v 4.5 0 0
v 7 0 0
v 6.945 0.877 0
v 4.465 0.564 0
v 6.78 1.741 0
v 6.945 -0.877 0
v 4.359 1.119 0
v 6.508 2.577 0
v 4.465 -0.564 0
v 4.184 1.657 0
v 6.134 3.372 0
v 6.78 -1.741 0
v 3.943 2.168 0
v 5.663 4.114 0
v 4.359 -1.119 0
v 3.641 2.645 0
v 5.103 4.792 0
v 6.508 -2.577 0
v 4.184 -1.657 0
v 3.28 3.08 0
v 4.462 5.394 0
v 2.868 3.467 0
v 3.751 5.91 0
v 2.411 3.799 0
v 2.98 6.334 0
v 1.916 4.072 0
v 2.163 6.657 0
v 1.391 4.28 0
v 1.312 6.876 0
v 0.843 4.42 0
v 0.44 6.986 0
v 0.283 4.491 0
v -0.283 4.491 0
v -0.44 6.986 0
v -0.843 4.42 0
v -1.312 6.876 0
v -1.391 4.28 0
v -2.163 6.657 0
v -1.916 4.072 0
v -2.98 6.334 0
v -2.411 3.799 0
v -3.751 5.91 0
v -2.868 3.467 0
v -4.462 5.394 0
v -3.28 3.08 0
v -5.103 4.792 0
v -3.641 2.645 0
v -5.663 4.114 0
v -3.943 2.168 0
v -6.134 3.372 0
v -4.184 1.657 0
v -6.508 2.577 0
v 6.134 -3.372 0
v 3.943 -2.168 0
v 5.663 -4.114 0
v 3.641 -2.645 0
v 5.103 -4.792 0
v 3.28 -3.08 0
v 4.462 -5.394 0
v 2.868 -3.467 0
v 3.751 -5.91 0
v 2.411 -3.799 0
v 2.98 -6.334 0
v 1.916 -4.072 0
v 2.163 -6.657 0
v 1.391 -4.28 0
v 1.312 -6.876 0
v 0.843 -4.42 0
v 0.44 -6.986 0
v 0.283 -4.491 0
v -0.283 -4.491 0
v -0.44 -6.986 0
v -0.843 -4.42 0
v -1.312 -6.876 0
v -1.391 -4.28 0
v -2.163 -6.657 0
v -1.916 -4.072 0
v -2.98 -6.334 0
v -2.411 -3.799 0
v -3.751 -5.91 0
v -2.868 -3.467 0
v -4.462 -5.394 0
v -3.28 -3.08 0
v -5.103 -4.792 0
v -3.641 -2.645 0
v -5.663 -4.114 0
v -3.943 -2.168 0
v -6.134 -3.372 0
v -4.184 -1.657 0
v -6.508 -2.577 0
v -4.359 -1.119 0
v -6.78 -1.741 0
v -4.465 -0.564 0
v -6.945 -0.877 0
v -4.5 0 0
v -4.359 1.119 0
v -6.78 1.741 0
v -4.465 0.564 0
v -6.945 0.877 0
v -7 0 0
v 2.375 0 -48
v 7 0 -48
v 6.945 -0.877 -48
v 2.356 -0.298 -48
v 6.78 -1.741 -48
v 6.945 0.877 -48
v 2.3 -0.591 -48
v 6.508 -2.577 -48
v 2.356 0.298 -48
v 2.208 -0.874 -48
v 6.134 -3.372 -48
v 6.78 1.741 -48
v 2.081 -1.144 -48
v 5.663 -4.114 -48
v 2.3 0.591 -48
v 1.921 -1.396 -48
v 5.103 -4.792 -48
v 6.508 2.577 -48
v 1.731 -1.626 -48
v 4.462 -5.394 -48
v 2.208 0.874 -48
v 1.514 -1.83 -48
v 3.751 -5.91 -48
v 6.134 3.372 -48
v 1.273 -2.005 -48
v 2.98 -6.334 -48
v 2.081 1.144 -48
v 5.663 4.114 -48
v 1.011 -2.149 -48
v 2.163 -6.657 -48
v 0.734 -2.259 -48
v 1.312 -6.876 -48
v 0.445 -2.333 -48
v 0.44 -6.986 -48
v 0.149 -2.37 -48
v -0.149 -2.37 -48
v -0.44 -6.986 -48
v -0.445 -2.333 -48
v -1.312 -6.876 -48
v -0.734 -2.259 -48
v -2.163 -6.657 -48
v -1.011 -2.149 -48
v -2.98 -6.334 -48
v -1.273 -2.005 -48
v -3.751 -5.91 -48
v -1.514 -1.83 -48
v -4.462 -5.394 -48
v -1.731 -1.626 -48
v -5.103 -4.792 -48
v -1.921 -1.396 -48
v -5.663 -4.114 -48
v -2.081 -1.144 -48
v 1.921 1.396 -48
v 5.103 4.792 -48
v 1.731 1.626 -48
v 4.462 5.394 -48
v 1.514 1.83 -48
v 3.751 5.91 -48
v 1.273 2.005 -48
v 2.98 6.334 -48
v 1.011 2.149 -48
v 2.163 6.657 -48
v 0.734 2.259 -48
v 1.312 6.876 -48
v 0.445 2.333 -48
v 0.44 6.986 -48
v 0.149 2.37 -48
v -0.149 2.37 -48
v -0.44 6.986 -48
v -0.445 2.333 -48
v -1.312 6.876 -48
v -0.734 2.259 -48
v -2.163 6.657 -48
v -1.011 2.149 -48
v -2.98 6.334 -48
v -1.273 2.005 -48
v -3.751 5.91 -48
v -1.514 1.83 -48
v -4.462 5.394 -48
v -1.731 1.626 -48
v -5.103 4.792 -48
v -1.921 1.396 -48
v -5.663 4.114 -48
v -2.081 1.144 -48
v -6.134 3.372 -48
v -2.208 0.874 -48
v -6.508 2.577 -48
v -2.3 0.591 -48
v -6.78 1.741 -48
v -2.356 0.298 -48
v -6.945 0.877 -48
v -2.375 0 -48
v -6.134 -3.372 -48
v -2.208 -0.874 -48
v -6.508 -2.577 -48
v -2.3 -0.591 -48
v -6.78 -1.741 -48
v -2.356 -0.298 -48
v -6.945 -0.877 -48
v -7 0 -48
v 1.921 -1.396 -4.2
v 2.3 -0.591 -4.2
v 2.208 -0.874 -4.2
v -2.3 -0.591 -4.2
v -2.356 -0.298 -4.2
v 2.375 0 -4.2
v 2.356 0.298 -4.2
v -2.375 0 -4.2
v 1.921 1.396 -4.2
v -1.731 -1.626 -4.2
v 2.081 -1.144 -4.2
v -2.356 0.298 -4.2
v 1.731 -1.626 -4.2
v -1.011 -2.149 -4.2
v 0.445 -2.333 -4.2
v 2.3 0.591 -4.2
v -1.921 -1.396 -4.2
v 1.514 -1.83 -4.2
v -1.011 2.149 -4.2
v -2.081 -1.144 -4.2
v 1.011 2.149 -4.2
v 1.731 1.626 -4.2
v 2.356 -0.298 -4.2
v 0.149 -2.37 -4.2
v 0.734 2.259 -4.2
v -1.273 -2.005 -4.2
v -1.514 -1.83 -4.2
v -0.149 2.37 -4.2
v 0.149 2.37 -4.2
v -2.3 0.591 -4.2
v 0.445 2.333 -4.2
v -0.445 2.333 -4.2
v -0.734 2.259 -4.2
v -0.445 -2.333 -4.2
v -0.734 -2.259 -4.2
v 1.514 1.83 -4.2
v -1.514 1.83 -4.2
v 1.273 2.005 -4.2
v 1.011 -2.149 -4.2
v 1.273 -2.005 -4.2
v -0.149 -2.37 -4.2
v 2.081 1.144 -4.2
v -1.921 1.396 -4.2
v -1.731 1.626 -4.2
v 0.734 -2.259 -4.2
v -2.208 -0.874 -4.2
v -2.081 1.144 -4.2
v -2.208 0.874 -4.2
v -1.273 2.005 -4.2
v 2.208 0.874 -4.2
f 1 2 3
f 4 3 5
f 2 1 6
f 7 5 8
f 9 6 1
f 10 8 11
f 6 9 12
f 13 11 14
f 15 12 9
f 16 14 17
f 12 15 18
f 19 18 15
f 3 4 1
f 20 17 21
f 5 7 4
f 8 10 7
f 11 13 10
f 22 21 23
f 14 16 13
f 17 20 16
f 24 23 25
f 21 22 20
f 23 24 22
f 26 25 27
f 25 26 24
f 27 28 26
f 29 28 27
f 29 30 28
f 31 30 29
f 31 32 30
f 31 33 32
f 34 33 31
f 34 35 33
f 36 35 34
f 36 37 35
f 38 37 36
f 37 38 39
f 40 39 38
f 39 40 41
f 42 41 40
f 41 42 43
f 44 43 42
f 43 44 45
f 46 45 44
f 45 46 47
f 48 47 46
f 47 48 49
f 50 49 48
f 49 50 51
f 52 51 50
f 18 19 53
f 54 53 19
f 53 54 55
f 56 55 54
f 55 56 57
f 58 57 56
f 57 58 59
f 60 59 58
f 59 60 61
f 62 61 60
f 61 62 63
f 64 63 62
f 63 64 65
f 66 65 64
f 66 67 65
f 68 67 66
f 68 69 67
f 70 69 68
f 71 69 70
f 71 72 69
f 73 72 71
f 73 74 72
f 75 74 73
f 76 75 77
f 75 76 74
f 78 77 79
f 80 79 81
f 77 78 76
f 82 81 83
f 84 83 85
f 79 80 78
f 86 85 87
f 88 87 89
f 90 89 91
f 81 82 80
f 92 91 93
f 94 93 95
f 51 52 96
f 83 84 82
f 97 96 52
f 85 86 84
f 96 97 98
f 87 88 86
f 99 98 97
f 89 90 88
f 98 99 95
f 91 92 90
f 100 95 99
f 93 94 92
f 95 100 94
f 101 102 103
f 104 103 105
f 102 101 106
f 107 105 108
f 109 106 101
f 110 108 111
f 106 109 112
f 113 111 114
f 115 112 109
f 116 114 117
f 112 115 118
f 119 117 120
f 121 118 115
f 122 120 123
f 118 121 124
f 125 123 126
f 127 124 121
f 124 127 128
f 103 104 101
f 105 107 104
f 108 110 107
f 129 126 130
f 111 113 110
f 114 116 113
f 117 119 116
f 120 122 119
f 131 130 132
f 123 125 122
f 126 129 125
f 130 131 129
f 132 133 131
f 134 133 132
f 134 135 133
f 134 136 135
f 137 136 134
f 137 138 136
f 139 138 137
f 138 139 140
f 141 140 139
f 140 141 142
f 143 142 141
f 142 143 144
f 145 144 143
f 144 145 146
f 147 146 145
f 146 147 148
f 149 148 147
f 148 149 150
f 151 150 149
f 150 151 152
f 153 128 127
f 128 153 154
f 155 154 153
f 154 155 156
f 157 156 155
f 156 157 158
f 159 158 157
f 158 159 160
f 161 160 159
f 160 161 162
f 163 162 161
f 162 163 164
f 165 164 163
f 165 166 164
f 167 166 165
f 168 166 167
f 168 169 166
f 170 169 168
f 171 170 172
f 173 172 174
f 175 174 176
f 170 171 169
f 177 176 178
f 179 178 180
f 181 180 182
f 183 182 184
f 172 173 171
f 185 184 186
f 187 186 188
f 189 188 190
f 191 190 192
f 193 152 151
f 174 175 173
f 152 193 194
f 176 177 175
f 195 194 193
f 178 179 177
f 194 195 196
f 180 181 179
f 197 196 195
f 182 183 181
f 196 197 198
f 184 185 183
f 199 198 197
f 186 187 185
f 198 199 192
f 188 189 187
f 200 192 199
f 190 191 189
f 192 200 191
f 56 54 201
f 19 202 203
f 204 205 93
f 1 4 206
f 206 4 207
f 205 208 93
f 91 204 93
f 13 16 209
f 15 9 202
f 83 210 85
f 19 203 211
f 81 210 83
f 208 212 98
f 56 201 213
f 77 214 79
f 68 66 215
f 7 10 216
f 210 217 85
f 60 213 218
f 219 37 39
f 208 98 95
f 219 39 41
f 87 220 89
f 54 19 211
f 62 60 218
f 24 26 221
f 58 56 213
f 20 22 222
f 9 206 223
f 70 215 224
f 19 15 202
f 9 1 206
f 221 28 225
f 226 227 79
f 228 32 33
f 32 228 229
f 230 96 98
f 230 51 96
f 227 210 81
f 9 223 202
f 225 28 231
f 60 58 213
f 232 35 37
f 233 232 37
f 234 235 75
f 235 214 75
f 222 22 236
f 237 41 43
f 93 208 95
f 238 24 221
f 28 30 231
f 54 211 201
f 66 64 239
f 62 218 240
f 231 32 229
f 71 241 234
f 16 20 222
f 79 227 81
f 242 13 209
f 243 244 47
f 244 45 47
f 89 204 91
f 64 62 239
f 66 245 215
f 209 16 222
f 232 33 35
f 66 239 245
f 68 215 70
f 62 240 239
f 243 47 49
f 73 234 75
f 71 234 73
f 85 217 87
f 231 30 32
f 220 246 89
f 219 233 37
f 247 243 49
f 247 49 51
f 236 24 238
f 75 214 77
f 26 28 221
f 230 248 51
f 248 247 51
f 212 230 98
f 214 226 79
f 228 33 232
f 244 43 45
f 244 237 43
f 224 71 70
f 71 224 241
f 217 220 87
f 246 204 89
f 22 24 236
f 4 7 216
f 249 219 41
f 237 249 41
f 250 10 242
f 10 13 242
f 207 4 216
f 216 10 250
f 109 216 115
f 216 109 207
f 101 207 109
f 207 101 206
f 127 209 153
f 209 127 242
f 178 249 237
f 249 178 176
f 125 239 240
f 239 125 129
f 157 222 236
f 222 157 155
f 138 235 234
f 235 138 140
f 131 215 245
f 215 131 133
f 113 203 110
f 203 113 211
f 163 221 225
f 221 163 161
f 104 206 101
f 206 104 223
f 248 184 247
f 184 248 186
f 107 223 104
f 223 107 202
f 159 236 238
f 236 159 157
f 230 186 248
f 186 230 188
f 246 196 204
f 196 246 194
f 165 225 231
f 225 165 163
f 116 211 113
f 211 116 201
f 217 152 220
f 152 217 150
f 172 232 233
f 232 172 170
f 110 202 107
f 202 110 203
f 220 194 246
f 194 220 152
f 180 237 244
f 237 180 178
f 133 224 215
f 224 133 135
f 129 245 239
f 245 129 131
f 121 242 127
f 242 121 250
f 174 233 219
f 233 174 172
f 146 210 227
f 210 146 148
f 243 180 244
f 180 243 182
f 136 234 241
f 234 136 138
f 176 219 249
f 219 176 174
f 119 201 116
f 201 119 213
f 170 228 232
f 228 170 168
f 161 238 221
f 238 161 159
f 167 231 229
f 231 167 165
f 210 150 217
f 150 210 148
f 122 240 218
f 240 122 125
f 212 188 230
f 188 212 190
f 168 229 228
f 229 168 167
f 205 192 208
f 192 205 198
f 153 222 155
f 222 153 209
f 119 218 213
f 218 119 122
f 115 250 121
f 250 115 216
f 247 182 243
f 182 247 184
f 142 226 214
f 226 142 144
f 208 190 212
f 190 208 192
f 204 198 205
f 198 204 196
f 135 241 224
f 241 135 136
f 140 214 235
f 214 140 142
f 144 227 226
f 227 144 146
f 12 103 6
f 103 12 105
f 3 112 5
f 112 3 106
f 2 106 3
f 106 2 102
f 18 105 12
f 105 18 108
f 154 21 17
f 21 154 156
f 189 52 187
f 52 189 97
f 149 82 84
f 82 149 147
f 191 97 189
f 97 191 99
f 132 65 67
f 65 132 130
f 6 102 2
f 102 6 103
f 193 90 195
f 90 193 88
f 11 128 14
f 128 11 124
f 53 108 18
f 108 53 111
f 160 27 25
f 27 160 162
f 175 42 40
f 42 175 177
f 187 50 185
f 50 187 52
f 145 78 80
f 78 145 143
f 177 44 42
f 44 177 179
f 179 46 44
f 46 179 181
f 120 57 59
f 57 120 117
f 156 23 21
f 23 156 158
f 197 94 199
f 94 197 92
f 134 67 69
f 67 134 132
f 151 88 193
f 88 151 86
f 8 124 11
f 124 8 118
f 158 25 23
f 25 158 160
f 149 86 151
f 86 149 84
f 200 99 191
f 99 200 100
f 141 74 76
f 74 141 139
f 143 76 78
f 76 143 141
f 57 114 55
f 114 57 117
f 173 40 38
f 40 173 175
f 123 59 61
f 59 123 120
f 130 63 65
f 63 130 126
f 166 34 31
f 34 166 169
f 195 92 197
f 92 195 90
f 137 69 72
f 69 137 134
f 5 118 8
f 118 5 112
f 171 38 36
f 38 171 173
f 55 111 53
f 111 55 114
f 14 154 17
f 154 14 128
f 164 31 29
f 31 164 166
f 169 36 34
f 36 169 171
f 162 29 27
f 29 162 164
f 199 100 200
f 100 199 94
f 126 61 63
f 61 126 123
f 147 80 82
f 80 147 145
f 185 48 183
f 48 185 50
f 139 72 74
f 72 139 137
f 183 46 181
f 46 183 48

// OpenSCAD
$fn = 50;


difference() {
	union() {
		translate(v = [0, 0, -48.0000000000]) {
			cylinder(h = 48, r = 7.0000000000);
		}
		cylinder(h = 0, r = 10.0000000000);
	}
	union() {
		translate(v = [0, 0, 0]) {
			rotate(a = [0, 0, 0]) {
				difference() {
					union() {
						#translate(v = [0, 0, -48.0000000000]) {
							cylinder(h = 48, r = 2.2500000000);
						}
						#translate(v = [0, 0, -4.2000000000]) {
							cylinder(h = 4.2000000000, r = 7.0000000000, r1 = 2.3750000000, r2 = 4.5000000000);
						}
						#translate(v = [0, 0, -48.0000000000]) {
							cylinder(h = 48, r = 2.3750000000);
						}
						#translate(v = [0, 0, -48.0000000000]) {
							cylinder(h = 48, r = 2.2500000000);
						}
					}
					union();
				}
			}
		}
	}
}
